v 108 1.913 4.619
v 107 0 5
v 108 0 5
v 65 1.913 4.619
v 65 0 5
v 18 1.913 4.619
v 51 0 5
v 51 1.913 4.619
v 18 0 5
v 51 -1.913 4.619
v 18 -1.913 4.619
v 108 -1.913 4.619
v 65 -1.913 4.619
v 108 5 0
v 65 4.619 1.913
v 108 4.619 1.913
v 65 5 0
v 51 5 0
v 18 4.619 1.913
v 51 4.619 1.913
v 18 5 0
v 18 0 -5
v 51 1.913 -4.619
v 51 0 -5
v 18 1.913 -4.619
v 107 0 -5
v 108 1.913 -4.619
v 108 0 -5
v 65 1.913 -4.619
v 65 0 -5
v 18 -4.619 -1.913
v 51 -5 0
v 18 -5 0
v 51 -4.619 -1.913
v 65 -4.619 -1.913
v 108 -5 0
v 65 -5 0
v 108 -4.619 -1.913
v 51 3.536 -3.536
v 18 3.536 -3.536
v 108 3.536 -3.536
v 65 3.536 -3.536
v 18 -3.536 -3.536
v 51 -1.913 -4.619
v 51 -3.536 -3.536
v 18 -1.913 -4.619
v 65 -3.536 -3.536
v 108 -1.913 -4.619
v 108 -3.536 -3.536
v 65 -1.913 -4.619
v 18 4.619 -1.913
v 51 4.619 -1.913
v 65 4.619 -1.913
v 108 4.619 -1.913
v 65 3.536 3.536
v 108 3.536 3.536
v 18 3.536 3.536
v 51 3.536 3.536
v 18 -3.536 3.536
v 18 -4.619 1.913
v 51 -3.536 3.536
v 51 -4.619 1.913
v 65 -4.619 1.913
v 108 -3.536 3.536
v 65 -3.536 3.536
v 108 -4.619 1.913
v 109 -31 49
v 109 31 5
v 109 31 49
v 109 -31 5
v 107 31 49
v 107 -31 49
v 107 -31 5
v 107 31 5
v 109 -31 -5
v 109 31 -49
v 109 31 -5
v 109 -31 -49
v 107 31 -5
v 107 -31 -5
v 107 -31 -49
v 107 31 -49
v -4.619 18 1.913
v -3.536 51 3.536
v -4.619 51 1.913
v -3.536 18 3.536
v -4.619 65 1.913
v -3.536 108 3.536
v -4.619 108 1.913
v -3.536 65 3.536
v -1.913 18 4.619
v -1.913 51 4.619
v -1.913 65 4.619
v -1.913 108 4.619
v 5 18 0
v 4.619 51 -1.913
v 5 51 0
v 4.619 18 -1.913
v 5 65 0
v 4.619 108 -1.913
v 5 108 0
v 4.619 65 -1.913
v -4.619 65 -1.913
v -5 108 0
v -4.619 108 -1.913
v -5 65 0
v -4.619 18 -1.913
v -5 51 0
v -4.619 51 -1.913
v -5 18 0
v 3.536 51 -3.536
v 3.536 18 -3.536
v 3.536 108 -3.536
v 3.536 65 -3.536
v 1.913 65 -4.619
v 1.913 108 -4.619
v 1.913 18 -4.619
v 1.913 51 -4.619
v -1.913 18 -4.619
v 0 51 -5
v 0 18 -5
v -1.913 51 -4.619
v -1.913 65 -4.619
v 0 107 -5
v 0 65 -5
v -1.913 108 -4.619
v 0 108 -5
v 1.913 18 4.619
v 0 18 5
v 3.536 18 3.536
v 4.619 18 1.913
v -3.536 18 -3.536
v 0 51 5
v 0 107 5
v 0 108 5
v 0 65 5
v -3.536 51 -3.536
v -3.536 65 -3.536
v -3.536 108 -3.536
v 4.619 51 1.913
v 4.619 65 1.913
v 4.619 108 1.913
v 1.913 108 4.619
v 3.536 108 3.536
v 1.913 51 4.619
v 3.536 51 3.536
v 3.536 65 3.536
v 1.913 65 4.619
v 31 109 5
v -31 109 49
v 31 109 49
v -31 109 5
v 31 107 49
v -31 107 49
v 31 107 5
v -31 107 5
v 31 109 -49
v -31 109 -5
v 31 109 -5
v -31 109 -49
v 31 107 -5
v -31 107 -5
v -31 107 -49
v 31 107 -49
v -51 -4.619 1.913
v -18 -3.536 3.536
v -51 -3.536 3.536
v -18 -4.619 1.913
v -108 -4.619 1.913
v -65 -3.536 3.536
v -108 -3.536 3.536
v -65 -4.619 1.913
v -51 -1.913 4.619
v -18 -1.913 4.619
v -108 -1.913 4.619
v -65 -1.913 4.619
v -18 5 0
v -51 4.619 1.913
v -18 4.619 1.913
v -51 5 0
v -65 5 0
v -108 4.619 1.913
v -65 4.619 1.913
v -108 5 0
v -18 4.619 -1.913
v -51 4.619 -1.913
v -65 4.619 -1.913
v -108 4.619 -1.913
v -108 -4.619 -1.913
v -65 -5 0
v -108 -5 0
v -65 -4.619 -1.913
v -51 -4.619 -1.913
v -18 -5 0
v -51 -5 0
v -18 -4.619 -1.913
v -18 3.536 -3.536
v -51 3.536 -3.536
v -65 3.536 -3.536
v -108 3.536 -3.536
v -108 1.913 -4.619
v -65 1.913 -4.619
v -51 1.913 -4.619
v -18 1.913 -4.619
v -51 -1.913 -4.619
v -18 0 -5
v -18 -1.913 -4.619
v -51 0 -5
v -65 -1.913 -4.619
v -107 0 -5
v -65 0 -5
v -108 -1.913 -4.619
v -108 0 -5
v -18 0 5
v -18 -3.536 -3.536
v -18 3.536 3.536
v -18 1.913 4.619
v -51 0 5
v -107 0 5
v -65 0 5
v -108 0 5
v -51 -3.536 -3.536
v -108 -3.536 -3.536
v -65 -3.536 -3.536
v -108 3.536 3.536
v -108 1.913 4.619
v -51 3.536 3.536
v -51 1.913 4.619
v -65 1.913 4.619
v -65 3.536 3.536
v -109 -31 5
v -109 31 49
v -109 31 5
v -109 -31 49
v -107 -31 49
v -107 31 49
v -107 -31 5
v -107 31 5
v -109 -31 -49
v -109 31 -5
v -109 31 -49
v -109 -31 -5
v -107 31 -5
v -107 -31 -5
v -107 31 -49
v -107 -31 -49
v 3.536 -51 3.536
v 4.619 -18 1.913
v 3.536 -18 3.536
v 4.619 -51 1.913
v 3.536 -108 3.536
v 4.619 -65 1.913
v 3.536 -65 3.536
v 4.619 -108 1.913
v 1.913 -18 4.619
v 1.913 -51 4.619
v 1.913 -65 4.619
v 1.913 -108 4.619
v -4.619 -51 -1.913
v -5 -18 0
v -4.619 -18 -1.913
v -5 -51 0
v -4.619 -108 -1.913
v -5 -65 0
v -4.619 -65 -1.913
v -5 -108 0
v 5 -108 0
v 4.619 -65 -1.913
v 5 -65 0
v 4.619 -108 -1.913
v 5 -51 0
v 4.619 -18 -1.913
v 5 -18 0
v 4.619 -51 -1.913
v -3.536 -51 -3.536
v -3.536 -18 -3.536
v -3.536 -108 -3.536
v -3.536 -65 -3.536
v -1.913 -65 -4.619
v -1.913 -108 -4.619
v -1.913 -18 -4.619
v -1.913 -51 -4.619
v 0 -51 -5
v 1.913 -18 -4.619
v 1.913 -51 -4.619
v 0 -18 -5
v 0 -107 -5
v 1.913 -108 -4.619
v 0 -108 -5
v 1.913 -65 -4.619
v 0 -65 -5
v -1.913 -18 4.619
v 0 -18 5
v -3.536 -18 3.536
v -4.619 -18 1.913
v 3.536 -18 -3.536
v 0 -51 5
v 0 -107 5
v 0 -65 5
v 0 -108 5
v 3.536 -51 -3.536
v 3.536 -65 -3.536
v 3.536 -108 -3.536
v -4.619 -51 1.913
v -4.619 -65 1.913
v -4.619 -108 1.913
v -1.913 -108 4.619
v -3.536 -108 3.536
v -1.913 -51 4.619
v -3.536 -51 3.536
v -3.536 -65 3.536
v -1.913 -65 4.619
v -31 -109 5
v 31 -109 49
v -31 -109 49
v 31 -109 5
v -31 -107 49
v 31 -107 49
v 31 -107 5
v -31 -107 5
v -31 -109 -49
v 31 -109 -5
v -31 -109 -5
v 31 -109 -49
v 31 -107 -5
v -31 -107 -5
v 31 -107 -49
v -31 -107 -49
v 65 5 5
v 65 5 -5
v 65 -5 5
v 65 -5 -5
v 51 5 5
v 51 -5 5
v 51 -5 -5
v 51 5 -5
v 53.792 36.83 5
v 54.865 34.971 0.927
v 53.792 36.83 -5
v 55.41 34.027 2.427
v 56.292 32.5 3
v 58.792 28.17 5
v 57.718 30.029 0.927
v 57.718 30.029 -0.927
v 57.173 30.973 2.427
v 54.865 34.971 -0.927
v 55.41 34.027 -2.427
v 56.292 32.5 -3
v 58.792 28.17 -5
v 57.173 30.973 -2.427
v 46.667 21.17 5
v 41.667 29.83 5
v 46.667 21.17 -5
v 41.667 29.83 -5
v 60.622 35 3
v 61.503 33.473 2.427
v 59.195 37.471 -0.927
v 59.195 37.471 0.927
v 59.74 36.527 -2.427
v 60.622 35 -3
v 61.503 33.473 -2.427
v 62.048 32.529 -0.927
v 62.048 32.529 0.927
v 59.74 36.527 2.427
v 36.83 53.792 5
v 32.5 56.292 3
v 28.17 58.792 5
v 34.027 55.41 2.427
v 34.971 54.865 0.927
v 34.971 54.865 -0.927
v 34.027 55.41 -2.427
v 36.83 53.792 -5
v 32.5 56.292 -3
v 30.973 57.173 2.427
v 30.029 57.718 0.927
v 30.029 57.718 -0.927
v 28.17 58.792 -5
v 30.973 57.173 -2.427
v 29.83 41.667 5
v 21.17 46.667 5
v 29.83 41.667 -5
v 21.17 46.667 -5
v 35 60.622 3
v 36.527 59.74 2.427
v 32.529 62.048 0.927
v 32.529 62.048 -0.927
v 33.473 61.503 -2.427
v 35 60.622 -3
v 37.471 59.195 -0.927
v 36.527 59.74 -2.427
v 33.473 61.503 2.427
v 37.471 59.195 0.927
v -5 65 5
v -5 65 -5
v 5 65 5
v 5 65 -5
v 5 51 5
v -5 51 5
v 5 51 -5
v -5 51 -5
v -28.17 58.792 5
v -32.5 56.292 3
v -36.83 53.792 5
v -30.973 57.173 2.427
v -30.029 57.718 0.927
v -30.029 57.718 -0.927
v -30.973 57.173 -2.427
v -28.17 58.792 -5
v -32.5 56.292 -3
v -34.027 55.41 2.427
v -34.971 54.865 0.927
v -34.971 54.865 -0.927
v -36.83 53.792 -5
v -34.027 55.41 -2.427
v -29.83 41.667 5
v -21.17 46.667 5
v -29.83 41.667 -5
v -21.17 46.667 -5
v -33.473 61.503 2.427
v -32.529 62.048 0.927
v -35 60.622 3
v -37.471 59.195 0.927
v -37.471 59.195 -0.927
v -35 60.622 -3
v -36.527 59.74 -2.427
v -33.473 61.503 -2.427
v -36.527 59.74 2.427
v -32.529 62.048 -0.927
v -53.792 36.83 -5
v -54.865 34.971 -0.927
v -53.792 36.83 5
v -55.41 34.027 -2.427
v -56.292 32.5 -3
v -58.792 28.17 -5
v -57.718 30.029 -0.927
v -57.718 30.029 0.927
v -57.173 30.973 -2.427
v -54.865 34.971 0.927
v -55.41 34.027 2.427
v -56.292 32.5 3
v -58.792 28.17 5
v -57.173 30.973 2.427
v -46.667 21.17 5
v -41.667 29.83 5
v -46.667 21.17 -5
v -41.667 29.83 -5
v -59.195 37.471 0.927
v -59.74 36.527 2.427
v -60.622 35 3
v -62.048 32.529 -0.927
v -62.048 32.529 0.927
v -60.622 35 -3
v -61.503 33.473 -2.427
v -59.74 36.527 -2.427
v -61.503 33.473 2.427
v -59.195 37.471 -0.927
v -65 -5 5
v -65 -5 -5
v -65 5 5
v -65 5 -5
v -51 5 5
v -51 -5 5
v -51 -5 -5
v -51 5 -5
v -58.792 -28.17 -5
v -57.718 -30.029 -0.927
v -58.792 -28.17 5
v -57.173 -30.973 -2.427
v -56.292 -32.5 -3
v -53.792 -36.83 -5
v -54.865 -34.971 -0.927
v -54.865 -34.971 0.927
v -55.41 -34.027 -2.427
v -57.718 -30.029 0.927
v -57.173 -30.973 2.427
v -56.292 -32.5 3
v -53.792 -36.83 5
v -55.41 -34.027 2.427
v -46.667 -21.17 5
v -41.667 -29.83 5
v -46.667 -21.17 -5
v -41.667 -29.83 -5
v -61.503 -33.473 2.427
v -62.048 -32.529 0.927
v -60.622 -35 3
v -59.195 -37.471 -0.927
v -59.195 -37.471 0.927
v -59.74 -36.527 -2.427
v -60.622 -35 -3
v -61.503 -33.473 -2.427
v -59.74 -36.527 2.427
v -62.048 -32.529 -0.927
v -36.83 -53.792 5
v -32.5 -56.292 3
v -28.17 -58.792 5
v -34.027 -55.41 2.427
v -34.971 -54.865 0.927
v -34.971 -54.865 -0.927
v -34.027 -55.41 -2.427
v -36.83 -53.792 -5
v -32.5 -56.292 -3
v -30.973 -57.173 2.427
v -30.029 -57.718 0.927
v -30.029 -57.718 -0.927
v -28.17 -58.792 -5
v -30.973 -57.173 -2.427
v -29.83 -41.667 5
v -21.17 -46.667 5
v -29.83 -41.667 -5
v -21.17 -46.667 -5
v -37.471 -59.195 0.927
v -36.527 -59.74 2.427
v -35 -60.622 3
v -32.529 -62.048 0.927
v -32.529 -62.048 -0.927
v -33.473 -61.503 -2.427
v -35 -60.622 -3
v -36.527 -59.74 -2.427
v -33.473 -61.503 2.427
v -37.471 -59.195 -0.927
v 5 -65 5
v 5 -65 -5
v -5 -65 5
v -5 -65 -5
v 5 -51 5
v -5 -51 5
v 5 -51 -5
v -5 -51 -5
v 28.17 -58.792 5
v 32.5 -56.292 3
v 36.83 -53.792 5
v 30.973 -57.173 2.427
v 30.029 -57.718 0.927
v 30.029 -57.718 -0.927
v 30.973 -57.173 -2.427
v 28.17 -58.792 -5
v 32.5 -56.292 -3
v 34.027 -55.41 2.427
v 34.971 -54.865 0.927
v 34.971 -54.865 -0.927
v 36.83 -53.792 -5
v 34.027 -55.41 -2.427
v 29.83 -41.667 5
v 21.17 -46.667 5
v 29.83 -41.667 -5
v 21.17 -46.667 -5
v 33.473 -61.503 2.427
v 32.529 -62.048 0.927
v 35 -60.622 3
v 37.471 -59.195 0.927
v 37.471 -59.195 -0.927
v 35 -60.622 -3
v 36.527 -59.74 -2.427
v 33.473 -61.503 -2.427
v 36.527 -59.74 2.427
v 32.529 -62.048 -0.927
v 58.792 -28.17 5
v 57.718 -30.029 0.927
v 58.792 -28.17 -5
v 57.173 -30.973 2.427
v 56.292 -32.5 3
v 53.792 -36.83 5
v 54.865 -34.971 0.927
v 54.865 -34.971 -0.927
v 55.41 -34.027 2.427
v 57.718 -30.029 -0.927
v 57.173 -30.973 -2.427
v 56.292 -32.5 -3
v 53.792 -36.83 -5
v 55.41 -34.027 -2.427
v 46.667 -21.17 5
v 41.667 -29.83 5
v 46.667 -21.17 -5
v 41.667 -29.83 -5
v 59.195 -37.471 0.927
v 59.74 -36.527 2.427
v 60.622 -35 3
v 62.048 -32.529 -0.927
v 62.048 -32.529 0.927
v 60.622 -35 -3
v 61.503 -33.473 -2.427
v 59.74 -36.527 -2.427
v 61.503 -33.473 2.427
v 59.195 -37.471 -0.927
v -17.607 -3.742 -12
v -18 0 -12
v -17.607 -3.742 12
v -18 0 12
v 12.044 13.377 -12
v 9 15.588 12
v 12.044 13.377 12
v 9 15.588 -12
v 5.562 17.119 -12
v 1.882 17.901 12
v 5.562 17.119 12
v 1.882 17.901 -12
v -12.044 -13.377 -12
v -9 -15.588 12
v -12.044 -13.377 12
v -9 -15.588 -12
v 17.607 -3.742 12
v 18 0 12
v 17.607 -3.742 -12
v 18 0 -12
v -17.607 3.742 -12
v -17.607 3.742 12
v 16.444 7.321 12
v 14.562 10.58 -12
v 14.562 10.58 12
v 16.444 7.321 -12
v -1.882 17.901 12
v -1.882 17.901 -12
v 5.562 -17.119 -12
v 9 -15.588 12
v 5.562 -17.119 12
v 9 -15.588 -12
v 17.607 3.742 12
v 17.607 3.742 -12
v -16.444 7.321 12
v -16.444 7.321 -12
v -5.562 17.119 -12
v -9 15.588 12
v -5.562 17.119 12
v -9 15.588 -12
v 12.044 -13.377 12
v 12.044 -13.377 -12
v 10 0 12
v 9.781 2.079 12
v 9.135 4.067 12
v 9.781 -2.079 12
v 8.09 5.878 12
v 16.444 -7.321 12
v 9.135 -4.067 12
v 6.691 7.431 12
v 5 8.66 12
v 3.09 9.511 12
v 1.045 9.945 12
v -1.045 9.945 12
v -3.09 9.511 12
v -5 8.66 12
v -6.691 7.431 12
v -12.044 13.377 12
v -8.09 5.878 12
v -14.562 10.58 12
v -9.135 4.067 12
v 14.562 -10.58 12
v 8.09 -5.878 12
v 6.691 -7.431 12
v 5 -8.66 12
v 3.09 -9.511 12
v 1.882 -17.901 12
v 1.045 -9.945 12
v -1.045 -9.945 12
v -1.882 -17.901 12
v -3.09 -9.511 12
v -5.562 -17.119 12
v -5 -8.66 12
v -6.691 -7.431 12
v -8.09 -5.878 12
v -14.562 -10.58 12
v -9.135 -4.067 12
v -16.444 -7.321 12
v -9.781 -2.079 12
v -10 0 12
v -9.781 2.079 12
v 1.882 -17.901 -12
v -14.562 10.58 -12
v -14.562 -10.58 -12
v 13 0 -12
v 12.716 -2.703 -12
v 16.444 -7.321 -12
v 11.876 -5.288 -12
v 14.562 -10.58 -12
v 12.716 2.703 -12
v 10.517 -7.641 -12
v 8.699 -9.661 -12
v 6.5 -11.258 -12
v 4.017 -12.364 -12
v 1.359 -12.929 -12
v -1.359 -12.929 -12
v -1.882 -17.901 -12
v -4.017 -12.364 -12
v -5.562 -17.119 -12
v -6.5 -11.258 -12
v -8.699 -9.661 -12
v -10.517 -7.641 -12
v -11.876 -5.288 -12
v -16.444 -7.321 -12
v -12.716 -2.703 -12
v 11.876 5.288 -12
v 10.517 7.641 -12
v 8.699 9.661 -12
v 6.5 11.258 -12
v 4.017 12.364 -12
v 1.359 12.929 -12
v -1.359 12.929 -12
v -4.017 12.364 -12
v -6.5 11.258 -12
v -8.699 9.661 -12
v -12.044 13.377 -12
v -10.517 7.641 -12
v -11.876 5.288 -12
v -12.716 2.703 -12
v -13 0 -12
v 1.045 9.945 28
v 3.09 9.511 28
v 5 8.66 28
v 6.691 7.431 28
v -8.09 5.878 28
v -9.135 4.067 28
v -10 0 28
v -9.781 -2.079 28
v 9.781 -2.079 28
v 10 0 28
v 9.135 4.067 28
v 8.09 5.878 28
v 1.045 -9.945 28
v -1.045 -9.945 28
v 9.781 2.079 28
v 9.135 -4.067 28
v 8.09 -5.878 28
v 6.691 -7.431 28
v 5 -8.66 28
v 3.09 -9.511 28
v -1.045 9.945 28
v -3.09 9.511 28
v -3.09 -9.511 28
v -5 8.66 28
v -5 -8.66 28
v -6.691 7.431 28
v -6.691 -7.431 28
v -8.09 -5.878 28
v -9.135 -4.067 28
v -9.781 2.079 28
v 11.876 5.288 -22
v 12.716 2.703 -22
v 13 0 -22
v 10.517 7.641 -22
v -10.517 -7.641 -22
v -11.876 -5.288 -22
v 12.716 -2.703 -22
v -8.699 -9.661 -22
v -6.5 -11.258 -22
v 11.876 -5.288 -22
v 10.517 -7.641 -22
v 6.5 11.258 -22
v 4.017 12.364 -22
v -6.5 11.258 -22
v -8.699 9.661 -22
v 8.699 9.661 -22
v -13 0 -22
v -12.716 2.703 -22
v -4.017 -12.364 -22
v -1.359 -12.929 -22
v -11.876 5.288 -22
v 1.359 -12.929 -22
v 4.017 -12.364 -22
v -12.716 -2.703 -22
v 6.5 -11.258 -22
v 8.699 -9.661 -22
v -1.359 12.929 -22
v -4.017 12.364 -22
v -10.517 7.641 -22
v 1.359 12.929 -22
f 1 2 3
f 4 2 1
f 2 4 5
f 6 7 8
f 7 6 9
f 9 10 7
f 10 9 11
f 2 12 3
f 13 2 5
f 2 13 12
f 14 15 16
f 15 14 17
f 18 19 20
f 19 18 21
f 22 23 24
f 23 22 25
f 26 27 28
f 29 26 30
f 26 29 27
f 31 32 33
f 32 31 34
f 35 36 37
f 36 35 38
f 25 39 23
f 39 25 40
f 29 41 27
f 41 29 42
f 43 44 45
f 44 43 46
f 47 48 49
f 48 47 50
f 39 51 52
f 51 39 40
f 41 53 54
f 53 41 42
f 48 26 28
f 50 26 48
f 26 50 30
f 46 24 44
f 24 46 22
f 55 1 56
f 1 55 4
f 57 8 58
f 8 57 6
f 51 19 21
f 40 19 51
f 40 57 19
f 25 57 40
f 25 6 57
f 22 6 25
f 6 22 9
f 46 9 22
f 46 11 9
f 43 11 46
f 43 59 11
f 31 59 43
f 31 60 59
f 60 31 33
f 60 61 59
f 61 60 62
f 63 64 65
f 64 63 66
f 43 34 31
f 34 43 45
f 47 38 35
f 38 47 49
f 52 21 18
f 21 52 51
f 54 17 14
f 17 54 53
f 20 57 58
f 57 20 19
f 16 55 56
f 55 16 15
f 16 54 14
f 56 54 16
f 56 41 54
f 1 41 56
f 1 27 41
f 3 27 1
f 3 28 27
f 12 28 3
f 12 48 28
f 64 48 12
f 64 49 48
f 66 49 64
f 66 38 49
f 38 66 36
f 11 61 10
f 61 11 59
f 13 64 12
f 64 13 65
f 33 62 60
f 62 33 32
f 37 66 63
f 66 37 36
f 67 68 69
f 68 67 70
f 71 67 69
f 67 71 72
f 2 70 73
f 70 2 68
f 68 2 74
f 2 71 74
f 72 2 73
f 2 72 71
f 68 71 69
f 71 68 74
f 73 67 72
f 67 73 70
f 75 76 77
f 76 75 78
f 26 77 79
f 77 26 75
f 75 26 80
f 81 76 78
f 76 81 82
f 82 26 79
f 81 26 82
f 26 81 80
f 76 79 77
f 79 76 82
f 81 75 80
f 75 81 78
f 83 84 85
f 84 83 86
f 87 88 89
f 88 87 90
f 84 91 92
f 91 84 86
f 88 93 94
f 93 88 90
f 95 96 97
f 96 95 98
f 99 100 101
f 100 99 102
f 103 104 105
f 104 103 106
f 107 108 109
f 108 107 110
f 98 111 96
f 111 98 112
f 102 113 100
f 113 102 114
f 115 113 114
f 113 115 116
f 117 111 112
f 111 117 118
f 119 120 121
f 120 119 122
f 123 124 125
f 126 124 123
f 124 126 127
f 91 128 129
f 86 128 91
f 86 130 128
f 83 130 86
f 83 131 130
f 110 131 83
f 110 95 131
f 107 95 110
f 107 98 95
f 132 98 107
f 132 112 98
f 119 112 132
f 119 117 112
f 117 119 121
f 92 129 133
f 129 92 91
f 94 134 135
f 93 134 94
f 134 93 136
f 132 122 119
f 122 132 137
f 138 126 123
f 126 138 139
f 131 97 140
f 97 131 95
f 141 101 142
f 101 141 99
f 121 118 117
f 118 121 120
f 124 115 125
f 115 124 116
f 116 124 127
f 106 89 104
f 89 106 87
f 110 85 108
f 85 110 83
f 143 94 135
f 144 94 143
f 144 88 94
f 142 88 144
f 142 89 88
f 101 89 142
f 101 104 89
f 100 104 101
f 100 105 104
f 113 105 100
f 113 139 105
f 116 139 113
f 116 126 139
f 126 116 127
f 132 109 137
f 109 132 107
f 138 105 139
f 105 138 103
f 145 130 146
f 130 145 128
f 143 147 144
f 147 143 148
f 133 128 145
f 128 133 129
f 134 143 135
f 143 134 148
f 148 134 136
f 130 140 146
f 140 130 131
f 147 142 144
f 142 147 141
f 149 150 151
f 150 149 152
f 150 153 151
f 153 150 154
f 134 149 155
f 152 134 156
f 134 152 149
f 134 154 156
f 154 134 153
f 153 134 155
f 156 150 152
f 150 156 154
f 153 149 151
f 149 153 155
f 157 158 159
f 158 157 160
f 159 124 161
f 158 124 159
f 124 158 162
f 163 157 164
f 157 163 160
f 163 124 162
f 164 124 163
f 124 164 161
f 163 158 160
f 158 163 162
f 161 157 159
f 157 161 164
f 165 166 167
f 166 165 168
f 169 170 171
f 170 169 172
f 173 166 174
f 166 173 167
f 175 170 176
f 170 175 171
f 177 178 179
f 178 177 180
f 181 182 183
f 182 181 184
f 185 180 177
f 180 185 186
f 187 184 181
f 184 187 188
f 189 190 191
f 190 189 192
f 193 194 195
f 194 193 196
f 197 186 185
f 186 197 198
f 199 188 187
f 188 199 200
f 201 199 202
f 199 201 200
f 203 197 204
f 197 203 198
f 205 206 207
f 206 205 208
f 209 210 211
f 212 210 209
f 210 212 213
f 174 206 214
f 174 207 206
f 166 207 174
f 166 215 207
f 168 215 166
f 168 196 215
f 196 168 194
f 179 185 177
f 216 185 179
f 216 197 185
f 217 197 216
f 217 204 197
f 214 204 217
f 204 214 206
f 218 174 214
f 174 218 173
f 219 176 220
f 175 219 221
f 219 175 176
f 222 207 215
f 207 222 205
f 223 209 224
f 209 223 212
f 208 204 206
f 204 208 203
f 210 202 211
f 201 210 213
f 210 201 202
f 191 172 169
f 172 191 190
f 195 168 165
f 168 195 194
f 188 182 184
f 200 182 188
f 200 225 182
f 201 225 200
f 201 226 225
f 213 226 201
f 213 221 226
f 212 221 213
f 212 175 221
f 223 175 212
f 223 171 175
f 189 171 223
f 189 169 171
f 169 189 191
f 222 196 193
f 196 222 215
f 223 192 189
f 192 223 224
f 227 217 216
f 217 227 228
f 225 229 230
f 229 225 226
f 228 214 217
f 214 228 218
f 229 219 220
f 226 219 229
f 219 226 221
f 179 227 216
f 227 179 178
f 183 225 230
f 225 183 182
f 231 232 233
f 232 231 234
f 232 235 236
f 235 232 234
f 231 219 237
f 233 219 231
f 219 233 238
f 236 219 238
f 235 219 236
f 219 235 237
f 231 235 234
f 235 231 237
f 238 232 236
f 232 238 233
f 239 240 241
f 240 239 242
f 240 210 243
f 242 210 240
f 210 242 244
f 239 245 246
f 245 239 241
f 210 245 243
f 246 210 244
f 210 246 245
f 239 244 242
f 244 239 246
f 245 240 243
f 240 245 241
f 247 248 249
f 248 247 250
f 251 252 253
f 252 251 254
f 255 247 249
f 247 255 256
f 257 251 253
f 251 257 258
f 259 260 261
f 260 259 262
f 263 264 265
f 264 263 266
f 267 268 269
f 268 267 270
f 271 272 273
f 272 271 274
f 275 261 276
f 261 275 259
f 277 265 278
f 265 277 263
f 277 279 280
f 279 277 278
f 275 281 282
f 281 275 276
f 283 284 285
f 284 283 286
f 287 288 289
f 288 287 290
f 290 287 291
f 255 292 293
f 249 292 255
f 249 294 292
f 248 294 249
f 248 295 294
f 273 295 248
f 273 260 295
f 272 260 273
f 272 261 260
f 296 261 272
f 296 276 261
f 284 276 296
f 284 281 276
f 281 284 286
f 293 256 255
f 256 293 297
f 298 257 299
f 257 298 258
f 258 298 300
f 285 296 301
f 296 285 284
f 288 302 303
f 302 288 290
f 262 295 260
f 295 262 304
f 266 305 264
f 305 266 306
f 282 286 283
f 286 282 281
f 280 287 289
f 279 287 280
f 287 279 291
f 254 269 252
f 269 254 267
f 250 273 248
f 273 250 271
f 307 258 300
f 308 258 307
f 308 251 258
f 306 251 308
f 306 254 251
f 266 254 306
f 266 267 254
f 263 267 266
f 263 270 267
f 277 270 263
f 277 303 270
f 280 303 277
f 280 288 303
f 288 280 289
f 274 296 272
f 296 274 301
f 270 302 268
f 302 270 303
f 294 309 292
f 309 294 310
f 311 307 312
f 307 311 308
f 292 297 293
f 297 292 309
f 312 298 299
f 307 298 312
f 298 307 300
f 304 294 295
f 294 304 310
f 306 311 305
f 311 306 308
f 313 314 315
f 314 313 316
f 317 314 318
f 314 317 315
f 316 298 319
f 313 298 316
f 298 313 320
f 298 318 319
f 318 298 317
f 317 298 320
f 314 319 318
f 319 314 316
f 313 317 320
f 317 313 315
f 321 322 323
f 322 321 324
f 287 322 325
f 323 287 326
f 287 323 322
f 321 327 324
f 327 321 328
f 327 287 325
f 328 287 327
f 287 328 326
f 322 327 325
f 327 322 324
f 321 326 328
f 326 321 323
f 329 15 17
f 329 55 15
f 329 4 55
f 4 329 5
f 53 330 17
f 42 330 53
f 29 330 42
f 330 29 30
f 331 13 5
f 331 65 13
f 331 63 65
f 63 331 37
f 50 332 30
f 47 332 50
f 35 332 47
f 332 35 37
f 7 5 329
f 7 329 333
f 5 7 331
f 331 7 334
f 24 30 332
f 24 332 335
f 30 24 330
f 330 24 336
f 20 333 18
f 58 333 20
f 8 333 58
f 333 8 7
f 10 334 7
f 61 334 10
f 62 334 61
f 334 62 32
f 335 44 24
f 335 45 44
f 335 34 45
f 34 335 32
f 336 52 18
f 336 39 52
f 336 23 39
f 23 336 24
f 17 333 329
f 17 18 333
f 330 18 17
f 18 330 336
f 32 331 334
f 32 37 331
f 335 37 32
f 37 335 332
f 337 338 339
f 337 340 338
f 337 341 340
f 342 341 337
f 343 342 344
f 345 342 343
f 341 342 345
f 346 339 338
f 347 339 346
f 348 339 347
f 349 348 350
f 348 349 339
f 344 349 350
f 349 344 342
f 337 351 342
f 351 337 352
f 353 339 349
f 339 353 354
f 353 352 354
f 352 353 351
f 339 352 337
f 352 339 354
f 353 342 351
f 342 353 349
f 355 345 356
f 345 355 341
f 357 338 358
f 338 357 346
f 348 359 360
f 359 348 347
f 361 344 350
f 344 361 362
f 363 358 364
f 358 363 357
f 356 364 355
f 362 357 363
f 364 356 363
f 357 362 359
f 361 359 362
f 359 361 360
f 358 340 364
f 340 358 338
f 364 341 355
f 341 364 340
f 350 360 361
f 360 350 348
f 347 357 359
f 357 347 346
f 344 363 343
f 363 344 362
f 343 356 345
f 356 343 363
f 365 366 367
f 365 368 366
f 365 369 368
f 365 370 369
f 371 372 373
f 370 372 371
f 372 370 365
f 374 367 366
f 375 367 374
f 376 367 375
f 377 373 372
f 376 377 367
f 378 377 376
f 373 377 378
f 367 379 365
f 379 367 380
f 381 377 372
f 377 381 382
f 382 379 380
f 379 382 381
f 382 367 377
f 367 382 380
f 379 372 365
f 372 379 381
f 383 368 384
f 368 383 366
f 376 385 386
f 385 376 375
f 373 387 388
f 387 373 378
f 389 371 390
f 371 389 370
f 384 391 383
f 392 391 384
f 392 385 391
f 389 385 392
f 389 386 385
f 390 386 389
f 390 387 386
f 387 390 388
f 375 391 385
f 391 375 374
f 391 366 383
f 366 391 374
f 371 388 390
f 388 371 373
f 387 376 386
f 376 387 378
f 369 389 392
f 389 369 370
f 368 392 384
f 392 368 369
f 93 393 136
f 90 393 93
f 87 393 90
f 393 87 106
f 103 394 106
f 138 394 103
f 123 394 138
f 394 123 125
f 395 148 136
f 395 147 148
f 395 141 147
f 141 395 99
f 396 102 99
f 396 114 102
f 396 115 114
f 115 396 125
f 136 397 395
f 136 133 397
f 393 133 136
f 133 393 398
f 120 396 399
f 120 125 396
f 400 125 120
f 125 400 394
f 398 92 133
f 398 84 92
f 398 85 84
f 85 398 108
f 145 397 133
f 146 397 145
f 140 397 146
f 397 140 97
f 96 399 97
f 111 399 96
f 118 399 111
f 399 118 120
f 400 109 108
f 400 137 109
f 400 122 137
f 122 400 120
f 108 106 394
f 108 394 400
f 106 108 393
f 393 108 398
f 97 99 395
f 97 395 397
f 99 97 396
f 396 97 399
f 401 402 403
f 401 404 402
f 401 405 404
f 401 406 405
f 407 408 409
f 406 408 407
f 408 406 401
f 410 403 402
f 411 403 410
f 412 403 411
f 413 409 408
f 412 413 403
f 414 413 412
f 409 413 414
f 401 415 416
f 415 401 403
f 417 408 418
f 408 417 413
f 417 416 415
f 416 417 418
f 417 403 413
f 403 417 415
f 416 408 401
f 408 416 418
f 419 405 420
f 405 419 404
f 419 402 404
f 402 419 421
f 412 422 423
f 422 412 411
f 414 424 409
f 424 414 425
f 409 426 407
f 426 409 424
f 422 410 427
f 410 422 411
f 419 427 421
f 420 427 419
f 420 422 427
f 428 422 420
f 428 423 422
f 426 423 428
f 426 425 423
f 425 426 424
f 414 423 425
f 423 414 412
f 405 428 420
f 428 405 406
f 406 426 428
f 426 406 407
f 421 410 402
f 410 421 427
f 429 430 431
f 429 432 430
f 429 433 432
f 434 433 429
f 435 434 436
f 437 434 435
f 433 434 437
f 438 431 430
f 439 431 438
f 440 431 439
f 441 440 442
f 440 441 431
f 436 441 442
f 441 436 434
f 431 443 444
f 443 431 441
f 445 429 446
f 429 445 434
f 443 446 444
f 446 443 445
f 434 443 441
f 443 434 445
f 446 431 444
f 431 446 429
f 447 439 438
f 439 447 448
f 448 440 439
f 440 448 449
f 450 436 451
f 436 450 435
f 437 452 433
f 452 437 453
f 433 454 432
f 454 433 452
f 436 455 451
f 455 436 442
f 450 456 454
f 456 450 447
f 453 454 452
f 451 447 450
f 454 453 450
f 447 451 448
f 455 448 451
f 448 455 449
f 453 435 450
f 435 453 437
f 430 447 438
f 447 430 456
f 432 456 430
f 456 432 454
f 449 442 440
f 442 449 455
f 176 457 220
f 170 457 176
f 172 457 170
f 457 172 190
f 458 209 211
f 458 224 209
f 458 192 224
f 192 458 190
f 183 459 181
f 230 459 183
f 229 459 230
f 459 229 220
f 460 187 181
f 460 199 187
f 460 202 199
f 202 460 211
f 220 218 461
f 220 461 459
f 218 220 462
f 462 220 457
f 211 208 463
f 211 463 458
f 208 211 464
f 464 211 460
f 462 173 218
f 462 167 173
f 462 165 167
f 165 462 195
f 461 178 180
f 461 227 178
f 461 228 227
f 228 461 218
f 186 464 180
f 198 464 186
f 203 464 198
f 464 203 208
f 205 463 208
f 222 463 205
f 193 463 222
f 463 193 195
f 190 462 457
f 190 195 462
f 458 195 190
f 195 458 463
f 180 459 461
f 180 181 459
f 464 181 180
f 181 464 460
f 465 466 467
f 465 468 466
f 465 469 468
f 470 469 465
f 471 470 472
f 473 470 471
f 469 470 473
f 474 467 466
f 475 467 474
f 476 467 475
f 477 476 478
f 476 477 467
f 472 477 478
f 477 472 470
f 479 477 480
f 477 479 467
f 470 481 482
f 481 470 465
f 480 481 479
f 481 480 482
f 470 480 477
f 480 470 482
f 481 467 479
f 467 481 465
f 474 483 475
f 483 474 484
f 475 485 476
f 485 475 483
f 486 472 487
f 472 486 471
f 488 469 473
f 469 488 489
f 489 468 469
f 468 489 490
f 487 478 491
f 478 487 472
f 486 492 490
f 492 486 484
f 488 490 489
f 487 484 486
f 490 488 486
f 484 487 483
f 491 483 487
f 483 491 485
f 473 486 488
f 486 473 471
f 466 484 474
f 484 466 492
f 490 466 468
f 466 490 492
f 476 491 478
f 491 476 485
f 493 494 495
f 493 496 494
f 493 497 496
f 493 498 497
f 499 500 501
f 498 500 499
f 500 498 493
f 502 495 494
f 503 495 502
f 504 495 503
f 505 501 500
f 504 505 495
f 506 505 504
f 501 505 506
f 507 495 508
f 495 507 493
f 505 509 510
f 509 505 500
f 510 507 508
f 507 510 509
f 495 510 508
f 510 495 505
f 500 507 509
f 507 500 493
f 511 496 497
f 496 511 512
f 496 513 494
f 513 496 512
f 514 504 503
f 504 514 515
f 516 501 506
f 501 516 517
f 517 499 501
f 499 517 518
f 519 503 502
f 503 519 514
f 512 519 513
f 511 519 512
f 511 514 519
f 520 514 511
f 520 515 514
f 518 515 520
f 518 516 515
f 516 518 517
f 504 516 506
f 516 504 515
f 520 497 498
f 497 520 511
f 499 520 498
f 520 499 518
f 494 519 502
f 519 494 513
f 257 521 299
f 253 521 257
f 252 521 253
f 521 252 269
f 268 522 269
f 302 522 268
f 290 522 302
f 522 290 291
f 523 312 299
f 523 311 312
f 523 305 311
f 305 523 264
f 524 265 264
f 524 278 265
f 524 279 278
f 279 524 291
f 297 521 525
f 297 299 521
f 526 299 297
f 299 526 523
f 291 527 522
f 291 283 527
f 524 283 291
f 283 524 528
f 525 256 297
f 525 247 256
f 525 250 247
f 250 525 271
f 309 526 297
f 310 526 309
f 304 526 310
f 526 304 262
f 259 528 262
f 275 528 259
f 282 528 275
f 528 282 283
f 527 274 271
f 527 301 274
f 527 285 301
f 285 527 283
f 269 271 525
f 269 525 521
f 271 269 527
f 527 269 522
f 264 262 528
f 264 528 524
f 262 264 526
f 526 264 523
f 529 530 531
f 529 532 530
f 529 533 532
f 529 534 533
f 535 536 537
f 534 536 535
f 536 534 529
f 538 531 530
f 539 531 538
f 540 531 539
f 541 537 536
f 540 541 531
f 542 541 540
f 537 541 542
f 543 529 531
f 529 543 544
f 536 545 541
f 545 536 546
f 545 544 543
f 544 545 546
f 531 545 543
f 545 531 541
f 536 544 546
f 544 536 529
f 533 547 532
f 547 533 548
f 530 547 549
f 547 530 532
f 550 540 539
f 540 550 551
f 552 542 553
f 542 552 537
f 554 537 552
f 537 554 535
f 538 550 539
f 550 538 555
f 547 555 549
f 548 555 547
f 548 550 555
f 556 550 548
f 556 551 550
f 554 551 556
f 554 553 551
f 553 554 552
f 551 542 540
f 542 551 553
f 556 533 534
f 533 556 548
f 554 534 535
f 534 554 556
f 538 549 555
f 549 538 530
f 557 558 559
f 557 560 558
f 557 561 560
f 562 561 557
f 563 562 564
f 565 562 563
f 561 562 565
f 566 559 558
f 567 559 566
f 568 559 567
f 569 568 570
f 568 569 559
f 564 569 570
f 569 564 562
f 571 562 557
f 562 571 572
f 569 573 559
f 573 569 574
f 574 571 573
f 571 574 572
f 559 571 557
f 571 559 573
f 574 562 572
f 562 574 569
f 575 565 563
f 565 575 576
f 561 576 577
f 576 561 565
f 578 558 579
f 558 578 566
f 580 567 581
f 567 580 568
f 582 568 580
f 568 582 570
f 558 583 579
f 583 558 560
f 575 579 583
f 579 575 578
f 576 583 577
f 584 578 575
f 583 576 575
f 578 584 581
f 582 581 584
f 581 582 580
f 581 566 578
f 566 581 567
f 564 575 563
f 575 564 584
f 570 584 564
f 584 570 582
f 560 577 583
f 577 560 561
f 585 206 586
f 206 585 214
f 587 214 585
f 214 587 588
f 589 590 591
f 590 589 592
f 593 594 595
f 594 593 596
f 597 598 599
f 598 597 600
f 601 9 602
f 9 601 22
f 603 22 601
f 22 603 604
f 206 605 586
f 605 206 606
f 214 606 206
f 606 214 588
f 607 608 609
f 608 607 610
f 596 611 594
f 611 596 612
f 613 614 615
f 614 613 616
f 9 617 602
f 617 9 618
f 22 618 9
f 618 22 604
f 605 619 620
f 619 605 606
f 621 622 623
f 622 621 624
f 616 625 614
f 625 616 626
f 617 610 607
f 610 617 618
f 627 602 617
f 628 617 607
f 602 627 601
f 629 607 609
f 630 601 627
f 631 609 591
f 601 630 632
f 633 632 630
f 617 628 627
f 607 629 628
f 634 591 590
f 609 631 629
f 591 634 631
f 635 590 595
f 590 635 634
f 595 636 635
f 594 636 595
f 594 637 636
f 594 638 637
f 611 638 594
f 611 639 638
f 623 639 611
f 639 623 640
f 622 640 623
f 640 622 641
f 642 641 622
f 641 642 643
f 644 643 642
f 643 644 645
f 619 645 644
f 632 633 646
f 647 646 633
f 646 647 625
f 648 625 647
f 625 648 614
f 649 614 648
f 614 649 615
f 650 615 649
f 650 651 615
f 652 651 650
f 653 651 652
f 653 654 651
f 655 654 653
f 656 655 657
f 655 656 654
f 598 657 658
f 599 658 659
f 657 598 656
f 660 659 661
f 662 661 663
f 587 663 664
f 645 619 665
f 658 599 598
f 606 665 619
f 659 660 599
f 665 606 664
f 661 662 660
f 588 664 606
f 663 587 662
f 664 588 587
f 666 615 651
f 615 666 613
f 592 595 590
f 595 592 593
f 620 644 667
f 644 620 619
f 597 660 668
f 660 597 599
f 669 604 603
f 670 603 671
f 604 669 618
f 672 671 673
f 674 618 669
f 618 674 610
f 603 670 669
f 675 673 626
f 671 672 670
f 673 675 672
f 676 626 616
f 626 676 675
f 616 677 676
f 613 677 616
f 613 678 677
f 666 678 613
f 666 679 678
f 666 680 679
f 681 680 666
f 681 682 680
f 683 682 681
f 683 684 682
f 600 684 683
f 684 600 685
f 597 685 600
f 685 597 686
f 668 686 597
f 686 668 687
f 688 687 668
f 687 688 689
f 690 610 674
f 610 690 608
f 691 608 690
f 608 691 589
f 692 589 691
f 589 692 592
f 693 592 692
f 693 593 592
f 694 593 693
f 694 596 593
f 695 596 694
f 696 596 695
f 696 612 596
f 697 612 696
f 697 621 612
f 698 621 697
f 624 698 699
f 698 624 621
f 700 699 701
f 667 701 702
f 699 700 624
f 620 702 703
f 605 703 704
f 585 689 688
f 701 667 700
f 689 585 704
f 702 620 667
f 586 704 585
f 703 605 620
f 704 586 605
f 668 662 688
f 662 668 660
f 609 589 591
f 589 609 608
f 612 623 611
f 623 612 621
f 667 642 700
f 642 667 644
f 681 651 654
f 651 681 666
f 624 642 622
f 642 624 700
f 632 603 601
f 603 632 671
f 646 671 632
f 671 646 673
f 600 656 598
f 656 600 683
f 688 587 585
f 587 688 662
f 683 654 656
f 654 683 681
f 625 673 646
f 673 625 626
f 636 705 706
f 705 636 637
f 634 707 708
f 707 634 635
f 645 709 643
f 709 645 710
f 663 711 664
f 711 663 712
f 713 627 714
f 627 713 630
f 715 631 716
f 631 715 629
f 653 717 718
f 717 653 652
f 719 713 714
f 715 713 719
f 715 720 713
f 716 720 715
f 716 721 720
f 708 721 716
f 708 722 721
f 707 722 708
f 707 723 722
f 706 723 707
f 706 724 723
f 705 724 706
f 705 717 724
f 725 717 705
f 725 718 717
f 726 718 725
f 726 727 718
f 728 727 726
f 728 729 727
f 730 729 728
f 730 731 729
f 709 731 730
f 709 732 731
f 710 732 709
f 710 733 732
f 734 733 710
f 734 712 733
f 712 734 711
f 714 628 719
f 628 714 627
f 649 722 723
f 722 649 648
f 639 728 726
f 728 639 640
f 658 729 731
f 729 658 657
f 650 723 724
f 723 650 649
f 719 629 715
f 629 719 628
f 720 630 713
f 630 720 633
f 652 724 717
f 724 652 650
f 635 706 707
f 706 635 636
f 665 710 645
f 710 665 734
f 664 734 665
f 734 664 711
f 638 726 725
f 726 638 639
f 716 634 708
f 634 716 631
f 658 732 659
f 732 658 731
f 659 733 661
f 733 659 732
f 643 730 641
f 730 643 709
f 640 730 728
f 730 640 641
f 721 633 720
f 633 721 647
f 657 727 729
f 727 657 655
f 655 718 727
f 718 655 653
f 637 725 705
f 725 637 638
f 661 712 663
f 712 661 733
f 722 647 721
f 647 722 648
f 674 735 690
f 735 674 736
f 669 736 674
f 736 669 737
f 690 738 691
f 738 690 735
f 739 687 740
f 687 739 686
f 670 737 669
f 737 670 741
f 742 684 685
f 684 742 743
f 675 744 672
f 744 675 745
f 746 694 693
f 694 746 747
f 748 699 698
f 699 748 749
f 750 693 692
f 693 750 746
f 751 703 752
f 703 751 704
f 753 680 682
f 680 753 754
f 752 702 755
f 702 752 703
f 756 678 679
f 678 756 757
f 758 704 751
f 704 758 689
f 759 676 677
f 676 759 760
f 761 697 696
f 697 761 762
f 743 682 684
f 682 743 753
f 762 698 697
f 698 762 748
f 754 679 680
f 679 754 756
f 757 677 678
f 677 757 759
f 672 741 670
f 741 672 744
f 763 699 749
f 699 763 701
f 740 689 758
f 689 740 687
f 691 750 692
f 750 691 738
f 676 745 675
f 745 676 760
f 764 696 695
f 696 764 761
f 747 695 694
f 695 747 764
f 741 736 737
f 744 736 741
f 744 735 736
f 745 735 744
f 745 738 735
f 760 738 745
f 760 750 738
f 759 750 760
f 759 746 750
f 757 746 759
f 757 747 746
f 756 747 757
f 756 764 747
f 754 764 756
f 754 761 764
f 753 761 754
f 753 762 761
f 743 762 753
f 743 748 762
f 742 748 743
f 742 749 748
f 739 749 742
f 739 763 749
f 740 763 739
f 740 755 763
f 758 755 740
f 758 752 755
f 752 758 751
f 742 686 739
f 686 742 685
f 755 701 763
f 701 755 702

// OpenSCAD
// 3DScad sample: orbital space station
// Uses only the currently round-trippable subset.

module scene_model() {
    hub_r = 18;
    hub_h = 24;
    arm_l = 90;
    arm_r = 5;
    panel_l = 44;
    panel_w = 62;
    panel_t = 2;
    ring_r = 58;

    union() {
        cylinder(h=hub_h, r=hub_r, center=true);
        translate([0, 0, hub_h / 2 + 8]) {
            cylinder(h=16, r=10, center=true);
        }
        translate([0, 0, -hub_h / 2 - 5]) {
            cylinder(h=10, r=13, center=true);
        }
        for (i = [0 : 1 : 3]) {
            rotate([0, 0, i * 90]) {
                translate([arm_l / 2 + hub_r, 0, 0]) {
                    rotate([0, 90, 0]) {
                        cylinder(h=arm_l, r=arm_r, center=true);
                    }
                }
                translate([arm_l + hub_r, 0, panel_l / 2 + arm_r]) {
                    cube([panel_t, panel_w, panel_l], center=true);
                }
                translate([arm_l + hub_r, 0, -(panel_l / 2 + arm_r)]) {
                    cube([panel_t, panel_w, panel_l], center=true);
                }
            }
        }
        for (j = [0 : 1 : 11]) {
            rotate([0, 0, j * 30]) {
                translate([ring_r, 0, 0]) {
                    cube([14, 10, 10], center=true);
                }
                translate([ring_r + 8, 0, 0]) {
                    rotate([0, 90, 0]) {
                        cylinder(h=8, r=3, center=true);
                    }
                }
            }
        }
    }
}

scene_model();
